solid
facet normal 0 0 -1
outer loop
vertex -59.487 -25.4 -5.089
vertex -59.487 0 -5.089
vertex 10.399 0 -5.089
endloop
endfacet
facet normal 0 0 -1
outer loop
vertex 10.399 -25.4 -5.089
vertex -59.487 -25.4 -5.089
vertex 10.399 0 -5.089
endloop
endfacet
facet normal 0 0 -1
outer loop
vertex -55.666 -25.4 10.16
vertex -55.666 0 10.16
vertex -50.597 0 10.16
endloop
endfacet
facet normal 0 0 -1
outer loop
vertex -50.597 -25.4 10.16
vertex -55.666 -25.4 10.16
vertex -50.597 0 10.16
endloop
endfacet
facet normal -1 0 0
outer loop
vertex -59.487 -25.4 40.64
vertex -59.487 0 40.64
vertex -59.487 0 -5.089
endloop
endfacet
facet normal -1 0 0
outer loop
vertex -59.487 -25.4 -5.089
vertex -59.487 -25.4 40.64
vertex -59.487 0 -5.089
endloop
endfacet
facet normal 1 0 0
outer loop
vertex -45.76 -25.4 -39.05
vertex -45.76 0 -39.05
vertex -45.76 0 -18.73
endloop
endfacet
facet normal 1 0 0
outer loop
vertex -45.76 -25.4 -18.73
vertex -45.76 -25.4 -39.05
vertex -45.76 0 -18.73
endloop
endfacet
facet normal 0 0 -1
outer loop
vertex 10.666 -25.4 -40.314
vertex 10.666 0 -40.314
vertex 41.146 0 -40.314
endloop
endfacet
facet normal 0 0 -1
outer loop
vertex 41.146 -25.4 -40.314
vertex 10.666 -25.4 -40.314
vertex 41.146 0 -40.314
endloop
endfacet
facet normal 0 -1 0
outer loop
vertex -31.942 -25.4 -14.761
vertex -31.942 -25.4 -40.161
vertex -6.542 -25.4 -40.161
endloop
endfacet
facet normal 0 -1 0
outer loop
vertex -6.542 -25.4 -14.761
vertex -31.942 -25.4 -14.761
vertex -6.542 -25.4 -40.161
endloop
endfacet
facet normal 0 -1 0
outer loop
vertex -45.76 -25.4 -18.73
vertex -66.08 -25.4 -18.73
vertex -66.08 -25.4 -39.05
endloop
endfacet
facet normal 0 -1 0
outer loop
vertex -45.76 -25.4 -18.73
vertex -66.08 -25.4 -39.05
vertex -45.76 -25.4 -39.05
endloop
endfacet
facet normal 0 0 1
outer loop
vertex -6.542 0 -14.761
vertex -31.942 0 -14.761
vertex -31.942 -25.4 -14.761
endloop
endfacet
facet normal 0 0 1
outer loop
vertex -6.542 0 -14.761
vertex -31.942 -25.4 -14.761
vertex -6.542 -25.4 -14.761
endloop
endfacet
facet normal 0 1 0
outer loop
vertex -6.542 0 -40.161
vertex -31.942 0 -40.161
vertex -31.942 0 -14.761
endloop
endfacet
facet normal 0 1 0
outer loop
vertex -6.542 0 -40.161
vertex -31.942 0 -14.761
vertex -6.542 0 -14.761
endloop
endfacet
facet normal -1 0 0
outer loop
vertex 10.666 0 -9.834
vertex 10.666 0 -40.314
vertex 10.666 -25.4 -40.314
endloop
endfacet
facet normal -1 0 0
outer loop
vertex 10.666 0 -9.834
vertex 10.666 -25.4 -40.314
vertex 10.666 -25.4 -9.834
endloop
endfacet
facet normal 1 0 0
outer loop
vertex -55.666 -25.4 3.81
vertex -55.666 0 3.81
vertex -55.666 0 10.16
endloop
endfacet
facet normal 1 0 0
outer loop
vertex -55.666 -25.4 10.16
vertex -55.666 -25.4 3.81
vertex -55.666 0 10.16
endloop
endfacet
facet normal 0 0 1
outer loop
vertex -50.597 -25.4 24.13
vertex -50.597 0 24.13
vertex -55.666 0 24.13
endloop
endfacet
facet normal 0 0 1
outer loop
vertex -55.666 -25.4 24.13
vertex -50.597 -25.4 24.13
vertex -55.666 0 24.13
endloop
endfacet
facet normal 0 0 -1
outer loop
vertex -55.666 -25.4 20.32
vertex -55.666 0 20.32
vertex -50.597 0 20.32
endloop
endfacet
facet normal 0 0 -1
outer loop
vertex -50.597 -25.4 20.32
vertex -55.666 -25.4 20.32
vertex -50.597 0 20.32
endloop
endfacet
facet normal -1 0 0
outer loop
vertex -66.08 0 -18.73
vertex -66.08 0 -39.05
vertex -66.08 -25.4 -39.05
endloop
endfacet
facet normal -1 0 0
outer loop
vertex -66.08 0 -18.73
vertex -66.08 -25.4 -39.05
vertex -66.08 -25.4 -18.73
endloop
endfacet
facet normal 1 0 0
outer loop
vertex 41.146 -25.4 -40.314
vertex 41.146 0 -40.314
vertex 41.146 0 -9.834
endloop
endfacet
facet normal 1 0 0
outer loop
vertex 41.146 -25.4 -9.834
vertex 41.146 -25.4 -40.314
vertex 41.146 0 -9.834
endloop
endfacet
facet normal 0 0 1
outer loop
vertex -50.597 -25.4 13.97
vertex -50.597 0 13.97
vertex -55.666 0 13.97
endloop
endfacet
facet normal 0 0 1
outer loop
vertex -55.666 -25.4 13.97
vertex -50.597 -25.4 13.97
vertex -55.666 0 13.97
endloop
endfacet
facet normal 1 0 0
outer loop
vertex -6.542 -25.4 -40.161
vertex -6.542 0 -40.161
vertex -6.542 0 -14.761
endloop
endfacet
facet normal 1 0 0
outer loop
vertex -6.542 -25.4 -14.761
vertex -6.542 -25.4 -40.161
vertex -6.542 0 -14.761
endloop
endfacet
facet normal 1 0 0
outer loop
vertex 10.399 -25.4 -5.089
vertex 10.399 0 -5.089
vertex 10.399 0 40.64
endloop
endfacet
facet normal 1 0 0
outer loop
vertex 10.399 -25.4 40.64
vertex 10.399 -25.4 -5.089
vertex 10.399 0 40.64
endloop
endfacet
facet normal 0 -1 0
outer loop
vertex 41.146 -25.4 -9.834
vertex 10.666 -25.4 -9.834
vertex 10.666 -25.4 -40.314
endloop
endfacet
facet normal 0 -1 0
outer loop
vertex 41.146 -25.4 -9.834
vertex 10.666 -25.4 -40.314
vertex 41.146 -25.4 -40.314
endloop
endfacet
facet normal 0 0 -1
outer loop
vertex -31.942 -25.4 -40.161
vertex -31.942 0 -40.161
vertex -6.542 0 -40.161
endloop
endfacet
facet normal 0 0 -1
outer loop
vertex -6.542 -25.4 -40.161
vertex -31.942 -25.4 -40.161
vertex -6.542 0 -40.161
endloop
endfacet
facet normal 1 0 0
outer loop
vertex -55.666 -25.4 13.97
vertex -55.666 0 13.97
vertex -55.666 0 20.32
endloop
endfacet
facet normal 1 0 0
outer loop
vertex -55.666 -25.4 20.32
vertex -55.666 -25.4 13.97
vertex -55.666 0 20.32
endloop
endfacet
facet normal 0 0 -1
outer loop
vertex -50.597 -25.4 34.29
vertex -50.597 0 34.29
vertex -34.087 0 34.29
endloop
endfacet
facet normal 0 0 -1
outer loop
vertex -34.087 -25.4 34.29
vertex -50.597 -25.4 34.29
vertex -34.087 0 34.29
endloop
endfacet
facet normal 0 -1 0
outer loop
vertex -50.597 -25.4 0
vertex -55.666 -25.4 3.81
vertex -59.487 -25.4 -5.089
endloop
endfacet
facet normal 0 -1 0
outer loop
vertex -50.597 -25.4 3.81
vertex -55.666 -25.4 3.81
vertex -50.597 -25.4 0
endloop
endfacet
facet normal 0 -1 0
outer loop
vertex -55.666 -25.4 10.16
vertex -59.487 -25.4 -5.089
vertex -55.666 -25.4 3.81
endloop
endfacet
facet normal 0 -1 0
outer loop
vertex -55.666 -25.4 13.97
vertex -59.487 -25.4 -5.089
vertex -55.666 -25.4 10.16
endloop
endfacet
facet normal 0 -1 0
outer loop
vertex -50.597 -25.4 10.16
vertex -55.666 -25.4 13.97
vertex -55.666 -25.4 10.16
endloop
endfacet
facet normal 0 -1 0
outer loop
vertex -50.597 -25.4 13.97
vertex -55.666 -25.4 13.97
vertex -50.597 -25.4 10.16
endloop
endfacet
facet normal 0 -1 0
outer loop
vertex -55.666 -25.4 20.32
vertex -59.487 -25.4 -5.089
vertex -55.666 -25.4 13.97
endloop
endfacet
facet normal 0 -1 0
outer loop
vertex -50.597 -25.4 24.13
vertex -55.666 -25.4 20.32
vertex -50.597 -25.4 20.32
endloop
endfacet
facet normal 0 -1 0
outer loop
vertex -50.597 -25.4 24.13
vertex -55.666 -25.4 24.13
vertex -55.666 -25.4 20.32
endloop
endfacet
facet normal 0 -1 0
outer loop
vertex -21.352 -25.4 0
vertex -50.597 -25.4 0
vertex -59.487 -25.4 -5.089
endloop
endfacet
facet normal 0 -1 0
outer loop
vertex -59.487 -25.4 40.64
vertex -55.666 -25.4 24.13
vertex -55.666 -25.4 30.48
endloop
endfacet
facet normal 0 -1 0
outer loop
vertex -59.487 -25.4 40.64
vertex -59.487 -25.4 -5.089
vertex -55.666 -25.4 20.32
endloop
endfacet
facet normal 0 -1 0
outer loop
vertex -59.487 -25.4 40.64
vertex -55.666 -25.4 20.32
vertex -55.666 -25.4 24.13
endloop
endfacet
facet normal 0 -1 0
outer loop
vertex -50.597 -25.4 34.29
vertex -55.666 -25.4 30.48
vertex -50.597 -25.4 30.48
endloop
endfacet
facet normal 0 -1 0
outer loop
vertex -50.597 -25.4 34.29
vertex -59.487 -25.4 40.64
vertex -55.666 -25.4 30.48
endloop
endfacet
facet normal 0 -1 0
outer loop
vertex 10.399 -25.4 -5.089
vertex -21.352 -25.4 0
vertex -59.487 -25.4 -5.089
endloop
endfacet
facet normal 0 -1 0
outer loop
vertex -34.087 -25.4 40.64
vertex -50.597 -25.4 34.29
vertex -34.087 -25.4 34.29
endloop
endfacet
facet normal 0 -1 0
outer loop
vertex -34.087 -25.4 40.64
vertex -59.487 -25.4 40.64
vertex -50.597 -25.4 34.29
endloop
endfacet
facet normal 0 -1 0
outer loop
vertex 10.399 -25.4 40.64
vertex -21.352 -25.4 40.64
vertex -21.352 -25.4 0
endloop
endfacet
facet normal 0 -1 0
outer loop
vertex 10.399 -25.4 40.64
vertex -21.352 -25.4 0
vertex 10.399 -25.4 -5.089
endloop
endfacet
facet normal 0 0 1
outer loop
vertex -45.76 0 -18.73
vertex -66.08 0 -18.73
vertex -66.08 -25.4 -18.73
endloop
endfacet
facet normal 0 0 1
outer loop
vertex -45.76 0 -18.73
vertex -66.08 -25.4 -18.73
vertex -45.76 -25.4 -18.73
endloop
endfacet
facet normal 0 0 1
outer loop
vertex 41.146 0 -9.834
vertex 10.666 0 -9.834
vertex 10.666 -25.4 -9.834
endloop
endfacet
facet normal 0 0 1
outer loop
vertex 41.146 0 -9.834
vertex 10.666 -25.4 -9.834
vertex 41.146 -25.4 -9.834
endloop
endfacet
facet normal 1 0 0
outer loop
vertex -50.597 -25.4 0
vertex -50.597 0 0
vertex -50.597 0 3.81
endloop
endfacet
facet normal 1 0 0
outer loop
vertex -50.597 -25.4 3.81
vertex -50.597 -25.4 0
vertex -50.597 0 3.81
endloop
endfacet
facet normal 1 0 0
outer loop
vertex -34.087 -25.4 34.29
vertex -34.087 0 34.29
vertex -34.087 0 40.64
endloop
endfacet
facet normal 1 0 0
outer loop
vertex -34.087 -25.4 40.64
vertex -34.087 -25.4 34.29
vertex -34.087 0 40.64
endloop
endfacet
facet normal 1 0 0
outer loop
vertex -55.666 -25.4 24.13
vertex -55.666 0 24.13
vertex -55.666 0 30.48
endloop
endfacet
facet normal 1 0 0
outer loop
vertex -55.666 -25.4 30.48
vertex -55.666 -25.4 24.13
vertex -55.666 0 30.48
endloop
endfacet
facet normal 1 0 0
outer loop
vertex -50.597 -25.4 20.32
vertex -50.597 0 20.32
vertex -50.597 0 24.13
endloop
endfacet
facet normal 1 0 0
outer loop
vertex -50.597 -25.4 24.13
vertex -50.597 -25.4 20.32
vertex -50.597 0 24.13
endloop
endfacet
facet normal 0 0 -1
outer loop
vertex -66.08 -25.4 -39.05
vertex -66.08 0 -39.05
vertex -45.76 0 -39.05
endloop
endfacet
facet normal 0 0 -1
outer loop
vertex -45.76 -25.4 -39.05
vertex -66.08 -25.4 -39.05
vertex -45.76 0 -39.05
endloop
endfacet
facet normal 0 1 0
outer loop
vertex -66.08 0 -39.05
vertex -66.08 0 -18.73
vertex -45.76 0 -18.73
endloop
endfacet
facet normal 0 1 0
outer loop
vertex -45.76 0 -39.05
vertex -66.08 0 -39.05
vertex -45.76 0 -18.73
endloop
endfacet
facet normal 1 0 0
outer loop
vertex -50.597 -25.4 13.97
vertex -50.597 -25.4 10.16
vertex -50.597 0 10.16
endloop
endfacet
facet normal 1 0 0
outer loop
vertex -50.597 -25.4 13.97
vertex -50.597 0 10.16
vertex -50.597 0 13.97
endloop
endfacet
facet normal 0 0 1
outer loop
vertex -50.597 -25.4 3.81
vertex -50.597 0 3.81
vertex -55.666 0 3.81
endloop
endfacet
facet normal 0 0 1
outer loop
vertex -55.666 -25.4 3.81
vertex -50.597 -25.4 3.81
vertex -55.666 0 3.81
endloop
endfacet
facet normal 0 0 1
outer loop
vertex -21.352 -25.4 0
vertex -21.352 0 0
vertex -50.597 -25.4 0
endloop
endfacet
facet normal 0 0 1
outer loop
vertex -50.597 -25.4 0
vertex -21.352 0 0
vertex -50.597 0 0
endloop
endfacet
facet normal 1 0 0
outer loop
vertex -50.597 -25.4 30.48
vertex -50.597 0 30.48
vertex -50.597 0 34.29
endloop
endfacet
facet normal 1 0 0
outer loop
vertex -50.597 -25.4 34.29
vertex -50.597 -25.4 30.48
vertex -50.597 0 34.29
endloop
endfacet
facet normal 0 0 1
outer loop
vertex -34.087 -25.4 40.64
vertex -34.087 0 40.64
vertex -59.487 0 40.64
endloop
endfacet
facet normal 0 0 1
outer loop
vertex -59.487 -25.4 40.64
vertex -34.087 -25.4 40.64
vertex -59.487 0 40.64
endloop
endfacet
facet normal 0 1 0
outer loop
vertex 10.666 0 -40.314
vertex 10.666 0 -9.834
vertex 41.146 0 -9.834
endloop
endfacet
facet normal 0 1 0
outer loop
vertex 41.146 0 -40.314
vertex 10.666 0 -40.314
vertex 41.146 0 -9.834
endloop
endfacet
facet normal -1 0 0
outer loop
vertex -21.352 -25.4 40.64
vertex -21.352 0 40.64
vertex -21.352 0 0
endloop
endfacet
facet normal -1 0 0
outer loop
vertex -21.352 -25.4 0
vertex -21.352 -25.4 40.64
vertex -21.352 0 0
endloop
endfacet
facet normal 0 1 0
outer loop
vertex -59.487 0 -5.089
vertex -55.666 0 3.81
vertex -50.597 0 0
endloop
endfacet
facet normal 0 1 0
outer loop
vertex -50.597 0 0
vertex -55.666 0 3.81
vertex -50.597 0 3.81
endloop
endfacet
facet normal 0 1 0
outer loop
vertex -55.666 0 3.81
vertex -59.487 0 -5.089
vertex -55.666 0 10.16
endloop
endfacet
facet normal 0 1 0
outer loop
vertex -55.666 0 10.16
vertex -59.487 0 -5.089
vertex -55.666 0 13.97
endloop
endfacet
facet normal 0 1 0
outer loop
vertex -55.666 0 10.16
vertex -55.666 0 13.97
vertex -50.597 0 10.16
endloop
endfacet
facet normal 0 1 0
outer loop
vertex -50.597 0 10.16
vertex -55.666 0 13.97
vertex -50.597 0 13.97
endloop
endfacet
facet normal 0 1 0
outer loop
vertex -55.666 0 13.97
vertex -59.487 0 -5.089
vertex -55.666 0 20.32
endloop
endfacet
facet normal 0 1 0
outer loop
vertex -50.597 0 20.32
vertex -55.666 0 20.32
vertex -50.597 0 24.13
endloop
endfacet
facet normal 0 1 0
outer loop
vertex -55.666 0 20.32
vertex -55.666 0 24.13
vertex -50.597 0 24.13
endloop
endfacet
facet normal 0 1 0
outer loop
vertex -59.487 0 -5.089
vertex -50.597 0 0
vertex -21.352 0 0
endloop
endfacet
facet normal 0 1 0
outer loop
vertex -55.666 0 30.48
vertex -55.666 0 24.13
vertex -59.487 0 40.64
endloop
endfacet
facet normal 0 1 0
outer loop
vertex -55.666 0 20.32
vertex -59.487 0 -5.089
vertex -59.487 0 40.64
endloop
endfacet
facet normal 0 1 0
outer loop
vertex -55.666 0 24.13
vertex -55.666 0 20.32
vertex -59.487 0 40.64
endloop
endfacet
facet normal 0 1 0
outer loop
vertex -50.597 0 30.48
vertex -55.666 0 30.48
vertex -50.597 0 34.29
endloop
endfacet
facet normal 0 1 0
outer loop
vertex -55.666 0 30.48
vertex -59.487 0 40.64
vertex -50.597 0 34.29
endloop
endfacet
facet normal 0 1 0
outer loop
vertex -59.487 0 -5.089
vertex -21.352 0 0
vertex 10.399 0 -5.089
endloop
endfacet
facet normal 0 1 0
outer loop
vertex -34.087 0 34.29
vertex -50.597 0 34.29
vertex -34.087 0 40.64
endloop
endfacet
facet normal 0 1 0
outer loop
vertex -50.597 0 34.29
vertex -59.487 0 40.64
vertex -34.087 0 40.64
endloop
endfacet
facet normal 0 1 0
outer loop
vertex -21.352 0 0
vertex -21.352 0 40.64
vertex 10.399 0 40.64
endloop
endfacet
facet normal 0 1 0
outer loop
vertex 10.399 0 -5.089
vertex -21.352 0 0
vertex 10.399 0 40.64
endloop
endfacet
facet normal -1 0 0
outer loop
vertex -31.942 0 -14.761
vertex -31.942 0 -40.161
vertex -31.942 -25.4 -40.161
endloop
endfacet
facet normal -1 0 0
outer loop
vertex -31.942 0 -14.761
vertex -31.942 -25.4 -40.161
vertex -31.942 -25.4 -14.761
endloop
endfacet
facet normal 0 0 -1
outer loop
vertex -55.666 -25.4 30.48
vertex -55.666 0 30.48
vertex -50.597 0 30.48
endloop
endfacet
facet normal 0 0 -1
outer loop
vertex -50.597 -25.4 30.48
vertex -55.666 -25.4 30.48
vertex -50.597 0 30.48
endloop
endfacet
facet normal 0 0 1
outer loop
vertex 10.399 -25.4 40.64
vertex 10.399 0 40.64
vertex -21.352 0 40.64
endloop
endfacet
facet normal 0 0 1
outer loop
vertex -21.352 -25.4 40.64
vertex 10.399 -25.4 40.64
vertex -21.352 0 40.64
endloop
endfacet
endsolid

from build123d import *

# Parameters (mm, degrees)
F4_DEPTH = 25.4
F1_W     = 20.32
F1_H     = 20.32
F5_DEPTH = 25.4
F2_W     = 25.4
F2_H     = 25.4
F6_DEPTH = 25.4
F3_W     = 30.48
F3_H     = 30.48
F7_DEPTH = 25.4


with BuildPart() as f4:
    # F0 (on Front) → F4 (new body)
    with BuildSketch(Plane.XZ):
        Polygon((-34.0868, 40.64), (-59.4868, 40.64), (-59.4868, -5.089056), (10.399, -5.089056), (10.399, 0), (10.399, 40.64), (-21.351995, 40.64), (-21.351995, 6.603997), (-21.351995, 0), (-50.5968, 0), (-50.5968, 3.81), (-55.666305, 3.81), (-55.666305, 10.16), (-50.5968, 10.16), (-50.5968, 13.97), (-55.666305, 13.97), (-55.666305, 20.32), (-50.5968, 20.32), (-50.5968, 24.13), (-55.666305, 24.13), (-55.666305, 30.48), (-50.5968, 30.48), (-50.5968, 34.29), (-34.0868, 34.29), align=None)
    extrude(amount=F4_DEPTH)


with BuildPart() as f5:
    # F1 (on Front) → F5 (new body)
    with BuildSketch(Plane.XZ):
        with Locations((-55.919694, -28.889862)):
            Rectangle(F1_W, F1_H)
    extrude(amount=F5_DEPTH)


with BuildPart() as f6:
    # F2 (on Front) → F6 (new body)
    with BuildSketch(Plane.XZ):
        with Locations((-19.242092, -27.461304)):
            Rectangle(F2_W, F2_H)
    extrude(amount=F6_DEPTH)


with BuildPart() as f7:
    # F3 (on Front) → F7 (new body)
    with BuildSketch(Plane.XZ):
        with Locations((25.905791, -25.073703)):
            Rectangle(F3_W, F3_H)
    extrude(amount=F7_DEPTH)


solid = Compound([f4.part, f5.part, f6.part, f7.part])
